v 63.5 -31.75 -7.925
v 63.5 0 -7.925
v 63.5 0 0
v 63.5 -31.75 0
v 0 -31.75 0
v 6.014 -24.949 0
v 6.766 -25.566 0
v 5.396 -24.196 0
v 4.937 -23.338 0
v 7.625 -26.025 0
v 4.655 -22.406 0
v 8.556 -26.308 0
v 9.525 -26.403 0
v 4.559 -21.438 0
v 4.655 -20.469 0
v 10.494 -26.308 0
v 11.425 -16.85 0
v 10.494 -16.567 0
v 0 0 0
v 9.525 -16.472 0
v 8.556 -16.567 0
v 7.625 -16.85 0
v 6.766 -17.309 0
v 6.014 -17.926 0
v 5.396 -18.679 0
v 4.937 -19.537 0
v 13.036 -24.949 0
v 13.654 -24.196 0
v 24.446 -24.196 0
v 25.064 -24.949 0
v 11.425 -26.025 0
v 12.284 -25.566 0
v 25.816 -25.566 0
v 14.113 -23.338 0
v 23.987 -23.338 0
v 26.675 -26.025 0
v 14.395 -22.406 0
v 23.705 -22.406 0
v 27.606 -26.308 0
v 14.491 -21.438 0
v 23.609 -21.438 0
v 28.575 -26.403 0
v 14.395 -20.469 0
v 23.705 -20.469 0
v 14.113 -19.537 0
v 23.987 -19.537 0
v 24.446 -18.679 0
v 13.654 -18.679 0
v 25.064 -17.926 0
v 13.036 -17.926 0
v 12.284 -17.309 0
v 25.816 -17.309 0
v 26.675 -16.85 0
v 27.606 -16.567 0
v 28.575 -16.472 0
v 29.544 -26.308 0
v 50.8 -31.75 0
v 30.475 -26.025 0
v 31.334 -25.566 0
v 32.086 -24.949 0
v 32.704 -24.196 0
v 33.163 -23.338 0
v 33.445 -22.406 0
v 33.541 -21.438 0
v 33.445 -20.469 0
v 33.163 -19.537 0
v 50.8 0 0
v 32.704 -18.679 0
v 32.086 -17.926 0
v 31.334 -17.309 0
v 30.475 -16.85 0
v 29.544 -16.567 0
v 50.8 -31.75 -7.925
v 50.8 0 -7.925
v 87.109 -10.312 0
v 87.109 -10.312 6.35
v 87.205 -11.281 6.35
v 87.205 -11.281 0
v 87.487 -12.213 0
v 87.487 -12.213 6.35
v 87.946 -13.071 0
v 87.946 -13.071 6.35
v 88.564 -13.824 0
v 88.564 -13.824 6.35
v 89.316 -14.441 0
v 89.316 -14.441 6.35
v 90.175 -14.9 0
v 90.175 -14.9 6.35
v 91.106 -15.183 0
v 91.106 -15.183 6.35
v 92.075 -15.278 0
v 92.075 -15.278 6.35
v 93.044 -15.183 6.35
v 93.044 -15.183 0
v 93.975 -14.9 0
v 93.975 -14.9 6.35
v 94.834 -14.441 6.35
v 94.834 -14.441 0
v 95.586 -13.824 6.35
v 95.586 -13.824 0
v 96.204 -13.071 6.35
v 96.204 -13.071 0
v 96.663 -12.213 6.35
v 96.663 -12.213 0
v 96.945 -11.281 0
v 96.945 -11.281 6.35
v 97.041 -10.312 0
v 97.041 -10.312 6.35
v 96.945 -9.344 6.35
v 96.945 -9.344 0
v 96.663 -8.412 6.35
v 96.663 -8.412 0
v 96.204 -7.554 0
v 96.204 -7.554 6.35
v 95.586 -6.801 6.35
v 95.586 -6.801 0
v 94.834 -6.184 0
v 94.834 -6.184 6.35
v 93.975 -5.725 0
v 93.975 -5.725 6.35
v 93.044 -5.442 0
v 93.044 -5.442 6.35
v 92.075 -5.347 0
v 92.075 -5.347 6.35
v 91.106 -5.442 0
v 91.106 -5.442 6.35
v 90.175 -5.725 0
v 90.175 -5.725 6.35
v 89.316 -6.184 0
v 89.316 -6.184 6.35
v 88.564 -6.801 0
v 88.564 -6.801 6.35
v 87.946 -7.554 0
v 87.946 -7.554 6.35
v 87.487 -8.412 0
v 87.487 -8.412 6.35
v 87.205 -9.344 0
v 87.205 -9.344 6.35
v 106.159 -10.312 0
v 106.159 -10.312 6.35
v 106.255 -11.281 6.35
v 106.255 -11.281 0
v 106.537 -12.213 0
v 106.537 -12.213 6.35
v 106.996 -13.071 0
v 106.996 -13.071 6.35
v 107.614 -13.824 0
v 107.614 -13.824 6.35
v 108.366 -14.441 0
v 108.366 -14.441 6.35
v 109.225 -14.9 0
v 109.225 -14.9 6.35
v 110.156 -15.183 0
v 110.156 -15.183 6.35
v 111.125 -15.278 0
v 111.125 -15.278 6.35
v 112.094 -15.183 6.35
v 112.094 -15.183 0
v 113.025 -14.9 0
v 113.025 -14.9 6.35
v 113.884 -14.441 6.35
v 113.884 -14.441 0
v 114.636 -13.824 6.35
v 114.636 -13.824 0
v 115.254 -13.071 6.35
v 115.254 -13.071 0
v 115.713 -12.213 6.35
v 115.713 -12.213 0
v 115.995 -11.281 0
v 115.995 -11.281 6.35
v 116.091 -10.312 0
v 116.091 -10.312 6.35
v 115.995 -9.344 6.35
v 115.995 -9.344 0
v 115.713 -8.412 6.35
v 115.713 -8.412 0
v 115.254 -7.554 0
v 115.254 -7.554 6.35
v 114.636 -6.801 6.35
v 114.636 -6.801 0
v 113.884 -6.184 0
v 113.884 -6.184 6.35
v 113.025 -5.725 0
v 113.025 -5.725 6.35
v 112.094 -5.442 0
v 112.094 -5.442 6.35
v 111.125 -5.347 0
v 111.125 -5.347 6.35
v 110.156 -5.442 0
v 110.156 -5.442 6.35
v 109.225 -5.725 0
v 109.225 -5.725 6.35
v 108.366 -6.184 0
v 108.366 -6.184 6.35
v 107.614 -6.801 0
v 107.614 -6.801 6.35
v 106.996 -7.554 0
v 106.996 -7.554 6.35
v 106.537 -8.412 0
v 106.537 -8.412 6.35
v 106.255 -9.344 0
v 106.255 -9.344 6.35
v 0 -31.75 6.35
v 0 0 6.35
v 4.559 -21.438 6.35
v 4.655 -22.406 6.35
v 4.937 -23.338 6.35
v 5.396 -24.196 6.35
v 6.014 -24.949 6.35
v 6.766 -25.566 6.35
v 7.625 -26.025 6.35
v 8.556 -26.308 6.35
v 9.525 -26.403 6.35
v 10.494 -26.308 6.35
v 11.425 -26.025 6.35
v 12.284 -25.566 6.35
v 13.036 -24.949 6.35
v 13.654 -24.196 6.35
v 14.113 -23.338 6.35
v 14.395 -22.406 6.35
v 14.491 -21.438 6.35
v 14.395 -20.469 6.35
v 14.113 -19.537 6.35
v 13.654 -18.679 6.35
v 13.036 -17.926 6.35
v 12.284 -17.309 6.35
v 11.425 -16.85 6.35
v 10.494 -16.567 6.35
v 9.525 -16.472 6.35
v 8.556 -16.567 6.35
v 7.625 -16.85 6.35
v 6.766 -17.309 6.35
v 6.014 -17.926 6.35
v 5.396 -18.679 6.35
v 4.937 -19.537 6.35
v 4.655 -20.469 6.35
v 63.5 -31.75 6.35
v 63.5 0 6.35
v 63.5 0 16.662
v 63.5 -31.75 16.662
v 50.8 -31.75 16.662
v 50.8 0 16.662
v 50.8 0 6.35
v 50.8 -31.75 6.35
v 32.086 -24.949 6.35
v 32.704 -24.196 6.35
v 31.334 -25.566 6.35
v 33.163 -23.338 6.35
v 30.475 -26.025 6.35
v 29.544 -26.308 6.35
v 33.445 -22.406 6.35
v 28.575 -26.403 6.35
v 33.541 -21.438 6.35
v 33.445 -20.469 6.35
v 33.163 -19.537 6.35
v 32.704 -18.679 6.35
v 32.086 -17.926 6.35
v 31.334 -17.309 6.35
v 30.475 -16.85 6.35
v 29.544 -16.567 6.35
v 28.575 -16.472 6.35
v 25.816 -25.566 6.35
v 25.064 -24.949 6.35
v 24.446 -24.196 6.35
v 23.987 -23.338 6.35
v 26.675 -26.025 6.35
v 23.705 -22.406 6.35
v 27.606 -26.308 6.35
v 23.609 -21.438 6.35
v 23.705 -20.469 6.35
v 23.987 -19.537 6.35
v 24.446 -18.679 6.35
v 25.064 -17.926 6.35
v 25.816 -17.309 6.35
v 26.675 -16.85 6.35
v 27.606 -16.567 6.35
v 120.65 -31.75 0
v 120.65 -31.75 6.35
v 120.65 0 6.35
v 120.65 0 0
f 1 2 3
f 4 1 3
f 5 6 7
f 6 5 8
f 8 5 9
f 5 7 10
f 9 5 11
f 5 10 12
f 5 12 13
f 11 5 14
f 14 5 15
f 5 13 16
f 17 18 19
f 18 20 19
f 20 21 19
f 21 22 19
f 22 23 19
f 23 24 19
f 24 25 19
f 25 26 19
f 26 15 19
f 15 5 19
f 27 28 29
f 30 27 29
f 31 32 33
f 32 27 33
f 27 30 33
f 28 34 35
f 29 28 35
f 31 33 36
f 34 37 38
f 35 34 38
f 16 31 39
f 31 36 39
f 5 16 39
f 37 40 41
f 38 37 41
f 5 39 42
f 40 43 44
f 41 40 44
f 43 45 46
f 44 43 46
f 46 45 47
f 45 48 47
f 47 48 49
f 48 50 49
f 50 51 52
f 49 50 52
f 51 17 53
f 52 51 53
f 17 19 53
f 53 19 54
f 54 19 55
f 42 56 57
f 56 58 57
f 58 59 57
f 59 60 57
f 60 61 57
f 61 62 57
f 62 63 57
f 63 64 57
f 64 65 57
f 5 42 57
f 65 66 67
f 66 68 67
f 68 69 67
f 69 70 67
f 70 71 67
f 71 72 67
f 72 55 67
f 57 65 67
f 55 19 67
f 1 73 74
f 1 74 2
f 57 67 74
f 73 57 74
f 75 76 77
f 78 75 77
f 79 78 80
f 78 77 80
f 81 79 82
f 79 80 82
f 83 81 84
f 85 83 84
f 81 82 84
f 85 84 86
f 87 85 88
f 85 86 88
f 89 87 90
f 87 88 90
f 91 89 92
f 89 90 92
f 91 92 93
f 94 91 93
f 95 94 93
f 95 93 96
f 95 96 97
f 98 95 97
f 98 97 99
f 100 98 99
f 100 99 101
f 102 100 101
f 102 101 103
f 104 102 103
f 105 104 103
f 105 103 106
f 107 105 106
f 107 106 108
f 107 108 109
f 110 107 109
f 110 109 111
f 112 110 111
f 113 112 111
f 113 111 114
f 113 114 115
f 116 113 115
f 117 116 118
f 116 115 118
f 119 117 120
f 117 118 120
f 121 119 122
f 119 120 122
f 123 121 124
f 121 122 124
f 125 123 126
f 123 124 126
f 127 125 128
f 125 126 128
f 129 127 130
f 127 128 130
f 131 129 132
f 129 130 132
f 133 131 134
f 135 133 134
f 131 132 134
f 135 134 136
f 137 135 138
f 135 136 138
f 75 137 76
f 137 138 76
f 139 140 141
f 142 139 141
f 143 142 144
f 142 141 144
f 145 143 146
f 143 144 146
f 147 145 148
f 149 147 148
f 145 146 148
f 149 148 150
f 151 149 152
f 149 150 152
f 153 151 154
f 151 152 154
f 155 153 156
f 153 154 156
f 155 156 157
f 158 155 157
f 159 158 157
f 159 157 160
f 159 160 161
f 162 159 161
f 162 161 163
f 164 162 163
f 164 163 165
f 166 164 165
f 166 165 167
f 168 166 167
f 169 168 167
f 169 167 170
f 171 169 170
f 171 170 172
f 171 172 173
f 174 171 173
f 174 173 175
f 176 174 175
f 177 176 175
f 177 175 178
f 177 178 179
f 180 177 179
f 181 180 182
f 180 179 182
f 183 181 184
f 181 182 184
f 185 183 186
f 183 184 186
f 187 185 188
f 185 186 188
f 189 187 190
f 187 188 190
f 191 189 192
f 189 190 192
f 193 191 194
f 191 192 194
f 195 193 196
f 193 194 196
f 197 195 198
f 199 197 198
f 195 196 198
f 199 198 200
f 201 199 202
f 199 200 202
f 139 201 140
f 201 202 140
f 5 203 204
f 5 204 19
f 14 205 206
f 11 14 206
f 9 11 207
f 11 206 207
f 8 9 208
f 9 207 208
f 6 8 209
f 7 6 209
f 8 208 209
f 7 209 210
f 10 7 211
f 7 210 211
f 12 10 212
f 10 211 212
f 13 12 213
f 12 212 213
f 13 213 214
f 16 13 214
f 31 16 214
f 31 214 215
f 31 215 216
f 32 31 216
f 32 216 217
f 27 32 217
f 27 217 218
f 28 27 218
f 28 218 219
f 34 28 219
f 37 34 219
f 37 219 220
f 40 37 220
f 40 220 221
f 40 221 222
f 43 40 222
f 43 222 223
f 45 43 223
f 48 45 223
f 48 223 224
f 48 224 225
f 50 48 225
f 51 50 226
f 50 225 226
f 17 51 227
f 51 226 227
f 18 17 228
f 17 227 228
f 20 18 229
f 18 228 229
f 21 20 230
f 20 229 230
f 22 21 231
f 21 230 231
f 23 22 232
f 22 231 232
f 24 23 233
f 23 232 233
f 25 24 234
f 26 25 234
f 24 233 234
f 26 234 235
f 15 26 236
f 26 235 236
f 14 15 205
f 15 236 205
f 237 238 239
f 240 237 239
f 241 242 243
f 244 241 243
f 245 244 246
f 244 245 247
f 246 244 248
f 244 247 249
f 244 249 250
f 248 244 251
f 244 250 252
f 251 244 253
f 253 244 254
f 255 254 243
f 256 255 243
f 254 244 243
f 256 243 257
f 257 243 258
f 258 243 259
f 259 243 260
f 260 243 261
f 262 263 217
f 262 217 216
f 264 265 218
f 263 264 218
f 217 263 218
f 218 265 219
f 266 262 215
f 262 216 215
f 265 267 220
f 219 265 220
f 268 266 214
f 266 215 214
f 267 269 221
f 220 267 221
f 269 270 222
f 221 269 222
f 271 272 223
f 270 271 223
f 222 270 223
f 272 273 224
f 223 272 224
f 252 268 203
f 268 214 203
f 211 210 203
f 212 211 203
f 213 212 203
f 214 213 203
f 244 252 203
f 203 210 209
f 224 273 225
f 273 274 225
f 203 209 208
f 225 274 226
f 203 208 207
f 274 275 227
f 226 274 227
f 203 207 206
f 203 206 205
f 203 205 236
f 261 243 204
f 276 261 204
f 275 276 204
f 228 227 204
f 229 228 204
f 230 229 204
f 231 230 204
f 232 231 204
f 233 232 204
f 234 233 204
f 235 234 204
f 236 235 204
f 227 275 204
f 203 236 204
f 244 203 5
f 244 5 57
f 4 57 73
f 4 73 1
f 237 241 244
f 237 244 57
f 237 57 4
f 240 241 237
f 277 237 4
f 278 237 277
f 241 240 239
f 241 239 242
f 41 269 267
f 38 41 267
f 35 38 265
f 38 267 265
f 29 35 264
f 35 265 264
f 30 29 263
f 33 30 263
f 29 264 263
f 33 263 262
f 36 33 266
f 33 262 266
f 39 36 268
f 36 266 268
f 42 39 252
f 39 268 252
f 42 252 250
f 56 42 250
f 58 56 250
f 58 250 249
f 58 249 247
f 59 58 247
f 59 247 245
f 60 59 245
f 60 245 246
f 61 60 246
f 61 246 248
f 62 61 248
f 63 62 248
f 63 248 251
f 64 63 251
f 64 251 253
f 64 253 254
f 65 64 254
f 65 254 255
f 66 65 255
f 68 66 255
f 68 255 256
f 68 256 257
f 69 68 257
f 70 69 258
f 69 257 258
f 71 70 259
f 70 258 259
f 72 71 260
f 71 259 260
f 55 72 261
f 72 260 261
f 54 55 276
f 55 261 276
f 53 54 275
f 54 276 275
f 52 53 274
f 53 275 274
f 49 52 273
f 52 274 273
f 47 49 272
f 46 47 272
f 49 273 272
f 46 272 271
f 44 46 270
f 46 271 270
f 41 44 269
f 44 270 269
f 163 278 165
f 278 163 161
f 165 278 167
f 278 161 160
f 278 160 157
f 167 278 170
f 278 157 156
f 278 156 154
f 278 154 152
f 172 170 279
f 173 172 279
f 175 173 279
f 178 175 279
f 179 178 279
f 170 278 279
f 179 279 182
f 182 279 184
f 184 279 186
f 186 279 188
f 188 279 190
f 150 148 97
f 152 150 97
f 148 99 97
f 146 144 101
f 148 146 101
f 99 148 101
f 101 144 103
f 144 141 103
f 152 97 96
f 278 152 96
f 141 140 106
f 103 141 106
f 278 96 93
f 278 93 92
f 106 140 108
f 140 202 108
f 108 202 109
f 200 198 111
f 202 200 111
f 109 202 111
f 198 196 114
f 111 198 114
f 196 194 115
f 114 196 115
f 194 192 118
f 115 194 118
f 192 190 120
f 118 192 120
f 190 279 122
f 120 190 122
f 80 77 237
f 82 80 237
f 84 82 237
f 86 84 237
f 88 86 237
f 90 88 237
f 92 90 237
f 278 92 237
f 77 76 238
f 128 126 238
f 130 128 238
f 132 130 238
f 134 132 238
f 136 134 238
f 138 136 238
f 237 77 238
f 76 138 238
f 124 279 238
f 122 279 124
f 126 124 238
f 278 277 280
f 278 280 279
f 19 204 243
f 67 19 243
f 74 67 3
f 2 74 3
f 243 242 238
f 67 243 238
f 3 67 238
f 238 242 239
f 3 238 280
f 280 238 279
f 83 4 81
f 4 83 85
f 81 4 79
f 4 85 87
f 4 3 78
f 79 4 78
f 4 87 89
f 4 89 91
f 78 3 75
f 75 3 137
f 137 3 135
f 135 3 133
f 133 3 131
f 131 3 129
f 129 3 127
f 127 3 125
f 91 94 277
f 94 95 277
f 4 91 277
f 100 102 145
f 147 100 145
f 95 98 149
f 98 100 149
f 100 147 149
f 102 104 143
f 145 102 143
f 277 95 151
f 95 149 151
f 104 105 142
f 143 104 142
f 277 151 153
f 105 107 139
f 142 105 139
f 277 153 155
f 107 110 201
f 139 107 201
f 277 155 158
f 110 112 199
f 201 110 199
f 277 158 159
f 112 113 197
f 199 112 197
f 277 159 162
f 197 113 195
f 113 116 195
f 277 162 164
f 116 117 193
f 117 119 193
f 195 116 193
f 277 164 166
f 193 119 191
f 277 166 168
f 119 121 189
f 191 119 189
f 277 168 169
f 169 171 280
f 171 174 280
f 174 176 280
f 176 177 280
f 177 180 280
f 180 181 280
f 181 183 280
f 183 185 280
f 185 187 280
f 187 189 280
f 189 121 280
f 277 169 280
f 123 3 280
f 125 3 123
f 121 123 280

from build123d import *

# Parameters (mm, degrees)
F1_DEPTH = 31.75
F3_D     = 9.9314


with BuildPart() as f1:
    # F0 (on Front) → F1 (new body)
    with BuildSketch(Plane.XZ):
        Polygon((0, 6.35), (0, 0), (50.8, 0), (50.8, -7.9248), (63.5, -7.9248), (63.5, 0), (120.65, 0), (120.65, 6.35), (63.5, 6.35), (63.5, 16.6624), (50.8, 16.6624), (50.8, 6.35), align=None)
    extrude(amount=F1_DEPTH)

    # F3 (through all)
    with Locations(Plane(origin=(0, 0, 0), x_dir=(1, 0, 0), z_dir=(0, 0, -1))):
        with Locations((111.125, 10.3124), (92.075, 10.3124), (28.575, 21.4376), (9.525, 21.4376)):
            Hole(F3_D / 2)


solid = f1.part
